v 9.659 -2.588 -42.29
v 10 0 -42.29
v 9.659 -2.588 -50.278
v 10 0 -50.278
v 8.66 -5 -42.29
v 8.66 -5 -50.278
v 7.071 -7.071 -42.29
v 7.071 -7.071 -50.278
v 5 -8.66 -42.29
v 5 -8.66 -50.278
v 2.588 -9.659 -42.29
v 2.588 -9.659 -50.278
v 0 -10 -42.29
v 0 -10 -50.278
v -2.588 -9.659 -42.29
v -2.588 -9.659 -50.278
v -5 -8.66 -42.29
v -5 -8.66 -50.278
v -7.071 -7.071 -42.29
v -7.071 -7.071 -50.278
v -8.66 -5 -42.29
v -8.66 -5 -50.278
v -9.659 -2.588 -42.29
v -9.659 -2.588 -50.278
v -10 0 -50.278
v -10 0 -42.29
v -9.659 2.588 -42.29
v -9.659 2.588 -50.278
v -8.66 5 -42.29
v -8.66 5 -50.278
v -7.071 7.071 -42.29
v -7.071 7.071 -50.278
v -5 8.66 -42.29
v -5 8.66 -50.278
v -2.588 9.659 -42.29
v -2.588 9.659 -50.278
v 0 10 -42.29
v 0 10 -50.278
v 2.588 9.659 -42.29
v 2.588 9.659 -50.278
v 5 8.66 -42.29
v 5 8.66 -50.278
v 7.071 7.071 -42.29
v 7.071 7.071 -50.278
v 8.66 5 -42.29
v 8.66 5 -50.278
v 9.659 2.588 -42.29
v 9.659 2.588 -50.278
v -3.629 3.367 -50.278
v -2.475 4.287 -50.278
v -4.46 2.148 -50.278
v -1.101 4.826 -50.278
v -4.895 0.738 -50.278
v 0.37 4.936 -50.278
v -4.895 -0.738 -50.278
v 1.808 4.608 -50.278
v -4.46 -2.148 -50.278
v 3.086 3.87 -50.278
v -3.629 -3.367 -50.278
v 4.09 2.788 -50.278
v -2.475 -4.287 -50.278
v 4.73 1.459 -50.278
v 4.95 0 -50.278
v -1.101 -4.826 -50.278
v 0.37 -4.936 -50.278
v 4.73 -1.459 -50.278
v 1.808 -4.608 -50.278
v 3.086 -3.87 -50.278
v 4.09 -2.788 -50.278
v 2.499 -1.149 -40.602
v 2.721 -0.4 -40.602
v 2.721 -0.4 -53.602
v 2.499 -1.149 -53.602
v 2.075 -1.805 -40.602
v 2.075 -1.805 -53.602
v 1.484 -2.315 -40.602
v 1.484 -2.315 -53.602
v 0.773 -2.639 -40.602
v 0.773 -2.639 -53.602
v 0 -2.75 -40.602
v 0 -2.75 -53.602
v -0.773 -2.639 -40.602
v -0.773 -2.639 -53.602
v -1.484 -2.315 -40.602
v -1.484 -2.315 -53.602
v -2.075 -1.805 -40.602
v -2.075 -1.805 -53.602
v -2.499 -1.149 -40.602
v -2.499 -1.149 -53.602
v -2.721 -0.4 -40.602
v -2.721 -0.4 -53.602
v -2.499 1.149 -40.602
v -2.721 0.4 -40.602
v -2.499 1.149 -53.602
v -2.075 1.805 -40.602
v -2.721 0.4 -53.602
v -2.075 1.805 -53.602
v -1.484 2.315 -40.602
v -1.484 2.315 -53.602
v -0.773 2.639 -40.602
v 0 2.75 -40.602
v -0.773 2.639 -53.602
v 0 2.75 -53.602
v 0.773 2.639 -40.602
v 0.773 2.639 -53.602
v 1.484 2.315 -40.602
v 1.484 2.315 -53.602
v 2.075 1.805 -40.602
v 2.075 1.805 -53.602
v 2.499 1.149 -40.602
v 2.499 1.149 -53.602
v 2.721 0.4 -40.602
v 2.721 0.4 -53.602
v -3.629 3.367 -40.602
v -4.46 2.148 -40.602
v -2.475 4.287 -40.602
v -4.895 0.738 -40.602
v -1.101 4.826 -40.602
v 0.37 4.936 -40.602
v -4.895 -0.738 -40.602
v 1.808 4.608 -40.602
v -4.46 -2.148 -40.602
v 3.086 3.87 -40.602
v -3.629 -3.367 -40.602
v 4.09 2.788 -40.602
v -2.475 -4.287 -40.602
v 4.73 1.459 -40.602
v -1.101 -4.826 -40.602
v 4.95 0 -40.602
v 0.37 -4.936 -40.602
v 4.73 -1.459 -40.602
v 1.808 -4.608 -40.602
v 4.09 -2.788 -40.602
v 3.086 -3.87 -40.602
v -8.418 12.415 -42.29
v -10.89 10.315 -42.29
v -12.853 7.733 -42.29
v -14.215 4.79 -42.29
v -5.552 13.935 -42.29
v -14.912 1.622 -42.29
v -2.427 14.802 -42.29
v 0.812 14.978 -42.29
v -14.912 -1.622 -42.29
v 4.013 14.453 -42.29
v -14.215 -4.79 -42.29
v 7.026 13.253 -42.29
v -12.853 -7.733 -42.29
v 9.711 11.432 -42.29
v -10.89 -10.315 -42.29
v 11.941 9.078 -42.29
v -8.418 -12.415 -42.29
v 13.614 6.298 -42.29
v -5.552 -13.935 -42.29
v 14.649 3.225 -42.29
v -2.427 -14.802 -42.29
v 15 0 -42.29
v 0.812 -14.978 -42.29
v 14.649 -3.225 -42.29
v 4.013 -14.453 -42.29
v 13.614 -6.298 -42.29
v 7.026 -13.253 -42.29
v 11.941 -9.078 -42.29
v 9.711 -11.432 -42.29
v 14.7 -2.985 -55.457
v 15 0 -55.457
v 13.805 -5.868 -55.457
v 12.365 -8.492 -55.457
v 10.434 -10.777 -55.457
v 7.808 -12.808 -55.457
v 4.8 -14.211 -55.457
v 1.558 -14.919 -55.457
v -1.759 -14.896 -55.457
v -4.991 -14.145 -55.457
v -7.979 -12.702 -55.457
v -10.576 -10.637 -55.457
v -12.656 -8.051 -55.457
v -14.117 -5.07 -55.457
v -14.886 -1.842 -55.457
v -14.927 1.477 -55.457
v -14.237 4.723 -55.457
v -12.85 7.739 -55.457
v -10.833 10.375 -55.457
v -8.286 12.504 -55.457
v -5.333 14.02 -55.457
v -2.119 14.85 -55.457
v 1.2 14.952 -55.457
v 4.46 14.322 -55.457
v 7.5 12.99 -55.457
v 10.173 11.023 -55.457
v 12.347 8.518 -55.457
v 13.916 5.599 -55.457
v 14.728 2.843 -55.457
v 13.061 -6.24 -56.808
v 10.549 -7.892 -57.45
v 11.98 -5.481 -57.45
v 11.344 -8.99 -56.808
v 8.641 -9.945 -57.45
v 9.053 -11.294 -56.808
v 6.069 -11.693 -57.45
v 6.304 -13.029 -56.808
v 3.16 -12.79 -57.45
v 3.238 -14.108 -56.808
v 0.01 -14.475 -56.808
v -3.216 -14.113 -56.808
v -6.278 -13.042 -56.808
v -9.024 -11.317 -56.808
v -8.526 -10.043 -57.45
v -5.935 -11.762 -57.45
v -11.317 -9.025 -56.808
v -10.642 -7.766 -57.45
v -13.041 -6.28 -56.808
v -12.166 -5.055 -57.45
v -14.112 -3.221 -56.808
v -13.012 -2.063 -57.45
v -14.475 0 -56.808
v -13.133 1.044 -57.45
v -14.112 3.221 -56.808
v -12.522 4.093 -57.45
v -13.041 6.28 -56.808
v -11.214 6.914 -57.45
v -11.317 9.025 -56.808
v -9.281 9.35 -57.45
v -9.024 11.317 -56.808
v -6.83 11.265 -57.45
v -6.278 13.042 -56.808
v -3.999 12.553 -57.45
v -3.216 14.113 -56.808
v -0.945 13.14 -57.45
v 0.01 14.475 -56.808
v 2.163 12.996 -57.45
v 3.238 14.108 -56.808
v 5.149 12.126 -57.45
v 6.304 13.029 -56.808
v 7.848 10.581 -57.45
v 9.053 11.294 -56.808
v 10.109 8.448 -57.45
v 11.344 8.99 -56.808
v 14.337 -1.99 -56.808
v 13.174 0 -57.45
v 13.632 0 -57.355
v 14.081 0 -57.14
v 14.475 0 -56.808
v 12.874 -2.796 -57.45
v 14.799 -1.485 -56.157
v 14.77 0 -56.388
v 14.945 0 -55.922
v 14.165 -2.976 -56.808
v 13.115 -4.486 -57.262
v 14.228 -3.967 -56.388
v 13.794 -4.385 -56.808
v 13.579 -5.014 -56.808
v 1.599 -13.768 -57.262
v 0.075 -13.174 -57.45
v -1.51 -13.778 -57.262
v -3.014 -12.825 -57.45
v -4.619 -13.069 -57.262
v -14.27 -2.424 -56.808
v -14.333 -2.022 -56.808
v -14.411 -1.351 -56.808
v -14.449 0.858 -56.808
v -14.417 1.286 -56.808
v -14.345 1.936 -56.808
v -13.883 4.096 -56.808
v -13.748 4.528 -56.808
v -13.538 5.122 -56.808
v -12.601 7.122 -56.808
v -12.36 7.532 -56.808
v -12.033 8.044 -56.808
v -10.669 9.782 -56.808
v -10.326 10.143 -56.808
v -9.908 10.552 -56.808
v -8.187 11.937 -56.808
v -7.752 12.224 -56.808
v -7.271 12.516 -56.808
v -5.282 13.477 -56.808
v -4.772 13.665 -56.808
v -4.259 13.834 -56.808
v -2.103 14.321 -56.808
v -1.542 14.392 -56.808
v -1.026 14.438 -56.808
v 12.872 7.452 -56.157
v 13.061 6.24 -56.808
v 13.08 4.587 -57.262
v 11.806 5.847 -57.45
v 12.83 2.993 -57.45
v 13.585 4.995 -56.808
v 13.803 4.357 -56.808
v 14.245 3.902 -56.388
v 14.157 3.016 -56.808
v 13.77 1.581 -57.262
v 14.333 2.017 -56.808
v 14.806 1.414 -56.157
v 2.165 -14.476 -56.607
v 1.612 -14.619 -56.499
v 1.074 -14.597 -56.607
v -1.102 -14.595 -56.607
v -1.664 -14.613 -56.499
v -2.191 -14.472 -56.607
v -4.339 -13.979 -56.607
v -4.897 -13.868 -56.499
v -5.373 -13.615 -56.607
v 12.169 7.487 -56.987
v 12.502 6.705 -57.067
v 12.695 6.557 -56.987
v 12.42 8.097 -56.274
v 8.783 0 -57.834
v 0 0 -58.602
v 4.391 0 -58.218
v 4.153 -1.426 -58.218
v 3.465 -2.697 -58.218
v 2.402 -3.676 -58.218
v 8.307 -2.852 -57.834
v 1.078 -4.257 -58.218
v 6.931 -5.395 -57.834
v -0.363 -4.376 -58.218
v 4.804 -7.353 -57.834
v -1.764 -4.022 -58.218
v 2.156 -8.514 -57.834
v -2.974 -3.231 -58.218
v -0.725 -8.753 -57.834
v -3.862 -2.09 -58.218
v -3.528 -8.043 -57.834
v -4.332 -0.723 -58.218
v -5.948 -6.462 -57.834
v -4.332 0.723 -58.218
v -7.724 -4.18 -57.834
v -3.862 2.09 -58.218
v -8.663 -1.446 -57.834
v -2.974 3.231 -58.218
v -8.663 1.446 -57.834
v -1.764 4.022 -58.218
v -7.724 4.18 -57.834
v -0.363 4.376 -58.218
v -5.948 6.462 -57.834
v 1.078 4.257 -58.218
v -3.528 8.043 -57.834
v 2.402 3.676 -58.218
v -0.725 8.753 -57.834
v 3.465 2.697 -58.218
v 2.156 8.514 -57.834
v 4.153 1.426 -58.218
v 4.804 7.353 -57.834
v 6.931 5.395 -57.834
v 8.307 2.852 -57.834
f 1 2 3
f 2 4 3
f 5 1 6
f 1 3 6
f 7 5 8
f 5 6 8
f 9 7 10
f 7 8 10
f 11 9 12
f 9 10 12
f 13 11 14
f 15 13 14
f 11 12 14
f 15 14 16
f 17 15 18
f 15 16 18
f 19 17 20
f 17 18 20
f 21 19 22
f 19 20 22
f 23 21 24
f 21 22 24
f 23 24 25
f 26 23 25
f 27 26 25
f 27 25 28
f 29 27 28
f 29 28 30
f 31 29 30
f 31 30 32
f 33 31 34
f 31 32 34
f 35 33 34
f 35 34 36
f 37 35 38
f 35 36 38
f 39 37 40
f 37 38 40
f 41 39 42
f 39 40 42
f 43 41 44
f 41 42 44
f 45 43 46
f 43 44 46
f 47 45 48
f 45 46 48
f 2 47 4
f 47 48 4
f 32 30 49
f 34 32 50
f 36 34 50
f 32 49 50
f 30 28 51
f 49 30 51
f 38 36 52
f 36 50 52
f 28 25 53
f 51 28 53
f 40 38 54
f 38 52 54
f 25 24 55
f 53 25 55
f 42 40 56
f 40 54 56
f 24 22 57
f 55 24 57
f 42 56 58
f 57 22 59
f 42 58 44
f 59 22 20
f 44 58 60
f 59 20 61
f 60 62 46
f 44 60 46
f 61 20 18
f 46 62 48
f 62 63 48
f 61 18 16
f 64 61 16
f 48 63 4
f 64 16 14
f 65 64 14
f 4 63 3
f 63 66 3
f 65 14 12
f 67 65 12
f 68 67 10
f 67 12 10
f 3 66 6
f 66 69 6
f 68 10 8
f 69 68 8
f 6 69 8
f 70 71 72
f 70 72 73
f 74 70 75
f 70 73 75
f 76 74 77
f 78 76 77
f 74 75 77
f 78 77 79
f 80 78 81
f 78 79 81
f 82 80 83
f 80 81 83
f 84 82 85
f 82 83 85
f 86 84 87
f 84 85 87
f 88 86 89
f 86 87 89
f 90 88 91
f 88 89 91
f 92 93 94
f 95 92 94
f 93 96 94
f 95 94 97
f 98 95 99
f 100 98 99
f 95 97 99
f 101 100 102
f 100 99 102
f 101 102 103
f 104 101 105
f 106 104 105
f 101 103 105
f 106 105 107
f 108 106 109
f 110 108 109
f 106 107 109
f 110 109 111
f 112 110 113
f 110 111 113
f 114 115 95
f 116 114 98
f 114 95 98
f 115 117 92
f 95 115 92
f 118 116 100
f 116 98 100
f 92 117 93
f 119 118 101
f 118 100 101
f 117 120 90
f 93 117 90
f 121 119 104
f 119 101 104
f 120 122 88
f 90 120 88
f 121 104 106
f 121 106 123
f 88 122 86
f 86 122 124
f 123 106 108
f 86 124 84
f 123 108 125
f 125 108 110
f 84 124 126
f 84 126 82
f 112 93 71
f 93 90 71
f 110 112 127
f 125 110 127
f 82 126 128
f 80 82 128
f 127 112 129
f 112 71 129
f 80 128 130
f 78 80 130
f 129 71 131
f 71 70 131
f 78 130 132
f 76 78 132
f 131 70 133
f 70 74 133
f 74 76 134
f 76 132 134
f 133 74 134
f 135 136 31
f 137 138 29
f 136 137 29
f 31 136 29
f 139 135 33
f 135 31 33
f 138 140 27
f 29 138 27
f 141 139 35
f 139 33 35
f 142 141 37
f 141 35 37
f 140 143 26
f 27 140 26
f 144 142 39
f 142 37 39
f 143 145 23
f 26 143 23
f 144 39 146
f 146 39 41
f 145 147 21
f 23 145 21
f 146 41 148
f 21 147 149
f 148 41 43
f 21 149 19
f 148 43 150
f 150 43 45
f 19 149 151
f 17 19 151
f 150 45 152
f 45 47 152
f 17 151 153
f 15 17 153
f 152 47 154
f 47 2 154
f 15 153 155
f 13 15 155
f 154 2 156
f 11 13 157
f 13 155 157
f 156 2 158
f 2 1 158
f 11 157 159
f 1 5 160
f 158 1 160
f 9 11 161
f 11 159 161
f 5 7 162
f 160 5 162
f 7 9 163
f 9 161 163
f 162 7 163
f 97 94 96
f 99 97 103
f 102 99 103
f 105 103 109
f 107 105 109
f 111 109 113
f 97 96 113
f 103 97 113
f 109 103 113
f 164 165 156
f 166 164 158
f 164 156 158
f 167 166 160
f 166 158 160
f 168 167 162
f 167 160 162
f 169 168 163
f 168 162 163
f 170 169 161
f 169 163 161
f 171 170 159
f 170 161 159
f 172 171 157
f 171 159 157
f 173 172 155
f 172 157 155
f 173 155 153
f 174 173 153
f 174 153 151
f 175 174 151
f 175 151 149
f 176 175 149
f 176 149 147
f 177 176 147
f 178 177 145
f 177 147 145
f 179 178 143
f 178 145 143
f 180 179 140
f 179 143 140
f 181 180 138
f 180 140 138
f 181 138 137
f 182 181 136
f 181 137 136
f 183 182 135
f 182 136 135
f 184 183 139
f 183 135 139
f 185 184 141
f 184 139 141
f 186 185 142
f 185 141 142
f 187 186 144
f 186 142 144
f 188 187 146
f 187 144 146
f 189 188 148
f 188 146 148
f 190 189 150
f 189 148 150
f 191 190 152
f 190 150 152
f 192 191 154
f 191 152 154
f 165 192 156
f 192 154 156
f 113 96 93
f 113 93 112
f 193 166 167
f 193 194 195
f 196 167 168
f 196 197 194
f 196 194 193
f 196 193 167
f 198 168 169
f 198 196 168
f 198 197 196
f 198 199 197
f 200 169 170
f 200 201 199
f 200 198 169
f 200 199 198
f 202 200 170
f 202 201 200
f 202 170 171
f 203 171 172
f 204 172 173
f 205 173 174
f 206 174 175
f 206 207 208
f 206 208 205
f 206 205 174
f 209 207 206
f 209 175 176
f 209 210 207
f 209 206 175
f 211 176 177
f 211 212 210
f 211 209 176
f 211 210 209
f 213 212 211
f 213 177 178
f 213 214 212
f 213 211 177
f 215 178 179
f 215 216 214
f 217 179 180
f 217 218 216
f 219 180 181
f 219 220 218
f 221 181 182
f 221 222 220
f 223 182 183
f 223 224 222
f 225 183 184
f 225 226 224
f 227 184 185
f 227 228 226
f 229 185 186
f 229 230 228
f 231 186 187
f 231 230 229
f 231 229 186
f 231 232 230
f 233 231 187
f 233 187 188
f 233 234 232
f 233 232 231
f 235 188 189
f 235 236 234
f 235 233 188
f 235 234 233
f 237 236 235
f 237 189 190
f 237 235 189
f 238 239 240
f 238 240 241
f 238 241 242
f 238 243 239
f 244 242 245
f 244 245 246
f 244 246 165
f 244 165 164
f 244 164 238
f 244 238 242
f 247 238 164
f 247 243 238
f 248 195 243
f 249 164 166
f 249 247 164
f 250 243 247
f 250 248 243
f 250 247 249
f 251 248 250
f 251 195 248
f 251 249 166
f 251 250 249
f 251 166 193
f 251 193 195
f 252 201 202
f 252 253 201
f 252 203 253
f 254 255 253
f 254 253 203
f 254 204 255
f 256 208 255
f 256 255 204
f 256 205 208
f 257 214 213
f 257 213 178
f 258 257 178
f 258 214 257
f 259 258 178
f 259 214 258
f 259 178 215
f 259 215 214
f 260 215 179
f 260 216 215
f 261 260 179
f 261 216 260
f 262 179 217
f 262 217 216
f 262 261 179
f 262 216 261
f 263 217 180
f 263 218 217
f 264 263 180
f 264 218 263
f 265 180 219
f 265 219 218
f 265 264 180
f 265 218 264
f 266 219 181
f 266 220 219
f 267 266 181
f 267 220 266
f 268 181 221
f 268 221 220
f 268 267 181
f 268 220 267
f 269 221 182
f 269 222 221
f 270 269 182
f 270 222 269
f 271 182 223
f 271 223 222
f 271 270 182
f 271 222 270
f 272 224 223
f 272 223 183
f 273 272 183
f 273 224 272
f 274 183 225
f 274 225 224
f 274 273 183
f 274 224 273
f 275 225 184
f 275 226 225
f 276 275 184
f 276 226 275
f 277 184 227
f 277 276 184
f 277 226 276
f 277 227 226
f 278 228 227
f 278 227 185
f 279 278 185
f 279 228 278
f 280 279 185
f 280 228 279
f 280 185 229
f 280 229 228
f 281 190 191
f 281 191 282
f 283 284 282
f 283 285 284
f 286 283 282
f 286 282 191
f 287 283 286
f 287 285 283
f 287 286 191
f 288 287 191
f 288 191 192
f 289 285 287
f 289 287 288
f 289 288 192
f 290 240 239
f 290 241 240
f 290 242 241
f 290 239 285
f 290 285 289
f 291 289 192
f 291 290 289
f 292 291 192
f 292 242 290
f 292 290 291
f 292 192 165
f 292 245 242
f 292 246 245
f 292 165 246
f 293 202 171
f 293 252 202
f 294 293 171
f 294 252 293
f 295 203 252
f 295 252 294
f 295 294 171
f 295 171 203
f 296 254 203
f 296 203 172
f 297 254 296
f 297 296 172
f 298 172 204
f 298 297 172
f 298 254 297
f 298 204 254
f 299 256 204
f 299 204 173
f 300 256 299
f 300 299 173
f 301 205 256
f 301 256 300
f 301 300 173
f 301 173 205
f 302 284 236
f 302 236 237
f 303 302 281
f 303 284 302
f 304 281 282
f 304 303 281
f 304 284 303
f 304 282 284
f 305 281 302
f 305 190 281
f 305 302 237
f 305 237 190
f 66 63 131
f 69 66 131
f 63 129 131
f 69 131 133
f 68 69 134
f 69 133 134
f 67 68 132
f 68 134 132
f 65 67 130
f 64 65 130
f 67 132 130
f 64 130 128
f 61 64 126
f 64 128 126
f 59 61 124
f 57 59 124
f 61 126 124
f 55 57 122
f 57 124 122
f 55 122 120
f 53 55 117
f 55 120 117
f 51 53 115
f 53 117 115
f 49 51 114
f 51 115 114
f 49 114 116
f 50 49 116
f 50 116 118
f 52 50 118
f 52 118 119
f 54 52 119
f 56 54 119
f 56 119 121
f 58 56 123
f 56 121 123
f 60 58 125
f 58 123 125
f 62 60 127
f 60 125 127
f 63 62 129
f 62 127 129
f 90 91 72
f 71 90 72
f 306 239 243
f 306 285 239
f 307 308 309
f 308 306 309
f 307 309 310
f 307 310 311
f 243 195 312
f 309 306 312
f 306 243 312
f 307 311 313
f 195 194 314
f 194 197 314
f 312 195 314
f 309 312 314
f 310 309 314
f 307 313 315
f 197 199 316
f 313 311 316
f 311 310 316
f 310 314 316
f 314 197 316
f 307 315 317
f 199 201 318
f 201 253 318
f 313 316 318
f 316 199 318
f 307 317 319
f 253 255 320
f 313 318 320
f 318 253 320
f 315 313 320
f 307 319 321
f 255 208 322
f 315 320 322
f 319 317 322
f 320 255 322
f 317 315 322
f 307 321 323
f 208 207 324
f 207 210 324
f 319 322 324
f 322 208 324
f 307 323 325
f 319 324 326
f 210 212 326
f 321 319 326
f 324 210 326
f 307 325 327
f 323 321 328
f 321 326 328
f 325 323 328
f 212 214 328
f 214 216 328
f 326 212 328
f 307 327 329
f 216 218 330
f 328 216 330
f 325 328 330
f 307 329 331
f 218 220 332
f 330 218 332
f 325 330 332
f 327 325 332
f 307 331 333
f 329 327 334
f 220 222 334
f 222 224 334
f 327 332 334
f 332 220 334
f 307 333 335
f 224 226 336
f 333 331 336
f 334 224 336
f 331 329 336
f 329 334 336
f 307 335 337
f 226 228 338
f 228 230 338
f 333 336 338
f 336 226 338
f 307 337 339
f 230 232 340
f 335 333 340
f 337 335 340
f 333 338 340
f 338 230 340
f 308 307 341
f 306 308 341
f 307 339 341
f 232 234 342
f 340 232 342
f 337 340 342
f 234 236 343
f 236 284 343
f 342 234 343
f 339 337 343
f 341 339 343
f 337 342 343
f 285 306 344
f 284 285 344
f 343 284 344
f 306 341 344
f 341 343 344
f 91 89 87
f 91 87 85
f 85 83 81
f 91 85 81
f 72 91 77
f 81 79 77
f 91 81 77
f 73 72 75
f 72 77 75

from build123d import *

# Parameters (mm, degrees)
FILLET1_R           = 2
SKETCH5_W           = 5.905041088
SKETCH5_H           = 0.8
BOSS_EXTRUDE4_DEPTH = 13


with BuildPart() as part:
    # Sketch1 → Revolve1 (revolve)
    with BuildSketch(Plane(origin=(0, 0, 0), x_dir=(1, 0, 0), z_dir=(0, 1, 0))):
        Polygon((2.75, 40.602114639), (2.75, 53.602114639), (0, 53.602114639), (0, 58.602114639), (15, 57.289784686), (15, 42.289784686), (10, 42.289784686), (10, 50.278222223), (4.95, 50.278222223), (4.95, 40.602114639), align=None)
    revolve(axis=Axis((0, 0, -53.602114639), (0, 0, -1)))

    # Fillet1
    fillet1_edges = [part.edges().sort_by_distance(p)[0] for p in [
        (-15, 0, -57.289784686),
    ]]
    fillet(fillet1_edges, radius=FILLET1_R)

    # Sketch5 → Boss-Extrude4 (add)
    with BuildSketch(Plane.XY.offset(-53.602114639)):
        with Locations((-0.048658074, 0)):
            Rectangle(SKETCH5_W, SKETCH5_H)
    extrude(amount=BOSS_EXTRUDE4_DEPTH)


solid = part.part
